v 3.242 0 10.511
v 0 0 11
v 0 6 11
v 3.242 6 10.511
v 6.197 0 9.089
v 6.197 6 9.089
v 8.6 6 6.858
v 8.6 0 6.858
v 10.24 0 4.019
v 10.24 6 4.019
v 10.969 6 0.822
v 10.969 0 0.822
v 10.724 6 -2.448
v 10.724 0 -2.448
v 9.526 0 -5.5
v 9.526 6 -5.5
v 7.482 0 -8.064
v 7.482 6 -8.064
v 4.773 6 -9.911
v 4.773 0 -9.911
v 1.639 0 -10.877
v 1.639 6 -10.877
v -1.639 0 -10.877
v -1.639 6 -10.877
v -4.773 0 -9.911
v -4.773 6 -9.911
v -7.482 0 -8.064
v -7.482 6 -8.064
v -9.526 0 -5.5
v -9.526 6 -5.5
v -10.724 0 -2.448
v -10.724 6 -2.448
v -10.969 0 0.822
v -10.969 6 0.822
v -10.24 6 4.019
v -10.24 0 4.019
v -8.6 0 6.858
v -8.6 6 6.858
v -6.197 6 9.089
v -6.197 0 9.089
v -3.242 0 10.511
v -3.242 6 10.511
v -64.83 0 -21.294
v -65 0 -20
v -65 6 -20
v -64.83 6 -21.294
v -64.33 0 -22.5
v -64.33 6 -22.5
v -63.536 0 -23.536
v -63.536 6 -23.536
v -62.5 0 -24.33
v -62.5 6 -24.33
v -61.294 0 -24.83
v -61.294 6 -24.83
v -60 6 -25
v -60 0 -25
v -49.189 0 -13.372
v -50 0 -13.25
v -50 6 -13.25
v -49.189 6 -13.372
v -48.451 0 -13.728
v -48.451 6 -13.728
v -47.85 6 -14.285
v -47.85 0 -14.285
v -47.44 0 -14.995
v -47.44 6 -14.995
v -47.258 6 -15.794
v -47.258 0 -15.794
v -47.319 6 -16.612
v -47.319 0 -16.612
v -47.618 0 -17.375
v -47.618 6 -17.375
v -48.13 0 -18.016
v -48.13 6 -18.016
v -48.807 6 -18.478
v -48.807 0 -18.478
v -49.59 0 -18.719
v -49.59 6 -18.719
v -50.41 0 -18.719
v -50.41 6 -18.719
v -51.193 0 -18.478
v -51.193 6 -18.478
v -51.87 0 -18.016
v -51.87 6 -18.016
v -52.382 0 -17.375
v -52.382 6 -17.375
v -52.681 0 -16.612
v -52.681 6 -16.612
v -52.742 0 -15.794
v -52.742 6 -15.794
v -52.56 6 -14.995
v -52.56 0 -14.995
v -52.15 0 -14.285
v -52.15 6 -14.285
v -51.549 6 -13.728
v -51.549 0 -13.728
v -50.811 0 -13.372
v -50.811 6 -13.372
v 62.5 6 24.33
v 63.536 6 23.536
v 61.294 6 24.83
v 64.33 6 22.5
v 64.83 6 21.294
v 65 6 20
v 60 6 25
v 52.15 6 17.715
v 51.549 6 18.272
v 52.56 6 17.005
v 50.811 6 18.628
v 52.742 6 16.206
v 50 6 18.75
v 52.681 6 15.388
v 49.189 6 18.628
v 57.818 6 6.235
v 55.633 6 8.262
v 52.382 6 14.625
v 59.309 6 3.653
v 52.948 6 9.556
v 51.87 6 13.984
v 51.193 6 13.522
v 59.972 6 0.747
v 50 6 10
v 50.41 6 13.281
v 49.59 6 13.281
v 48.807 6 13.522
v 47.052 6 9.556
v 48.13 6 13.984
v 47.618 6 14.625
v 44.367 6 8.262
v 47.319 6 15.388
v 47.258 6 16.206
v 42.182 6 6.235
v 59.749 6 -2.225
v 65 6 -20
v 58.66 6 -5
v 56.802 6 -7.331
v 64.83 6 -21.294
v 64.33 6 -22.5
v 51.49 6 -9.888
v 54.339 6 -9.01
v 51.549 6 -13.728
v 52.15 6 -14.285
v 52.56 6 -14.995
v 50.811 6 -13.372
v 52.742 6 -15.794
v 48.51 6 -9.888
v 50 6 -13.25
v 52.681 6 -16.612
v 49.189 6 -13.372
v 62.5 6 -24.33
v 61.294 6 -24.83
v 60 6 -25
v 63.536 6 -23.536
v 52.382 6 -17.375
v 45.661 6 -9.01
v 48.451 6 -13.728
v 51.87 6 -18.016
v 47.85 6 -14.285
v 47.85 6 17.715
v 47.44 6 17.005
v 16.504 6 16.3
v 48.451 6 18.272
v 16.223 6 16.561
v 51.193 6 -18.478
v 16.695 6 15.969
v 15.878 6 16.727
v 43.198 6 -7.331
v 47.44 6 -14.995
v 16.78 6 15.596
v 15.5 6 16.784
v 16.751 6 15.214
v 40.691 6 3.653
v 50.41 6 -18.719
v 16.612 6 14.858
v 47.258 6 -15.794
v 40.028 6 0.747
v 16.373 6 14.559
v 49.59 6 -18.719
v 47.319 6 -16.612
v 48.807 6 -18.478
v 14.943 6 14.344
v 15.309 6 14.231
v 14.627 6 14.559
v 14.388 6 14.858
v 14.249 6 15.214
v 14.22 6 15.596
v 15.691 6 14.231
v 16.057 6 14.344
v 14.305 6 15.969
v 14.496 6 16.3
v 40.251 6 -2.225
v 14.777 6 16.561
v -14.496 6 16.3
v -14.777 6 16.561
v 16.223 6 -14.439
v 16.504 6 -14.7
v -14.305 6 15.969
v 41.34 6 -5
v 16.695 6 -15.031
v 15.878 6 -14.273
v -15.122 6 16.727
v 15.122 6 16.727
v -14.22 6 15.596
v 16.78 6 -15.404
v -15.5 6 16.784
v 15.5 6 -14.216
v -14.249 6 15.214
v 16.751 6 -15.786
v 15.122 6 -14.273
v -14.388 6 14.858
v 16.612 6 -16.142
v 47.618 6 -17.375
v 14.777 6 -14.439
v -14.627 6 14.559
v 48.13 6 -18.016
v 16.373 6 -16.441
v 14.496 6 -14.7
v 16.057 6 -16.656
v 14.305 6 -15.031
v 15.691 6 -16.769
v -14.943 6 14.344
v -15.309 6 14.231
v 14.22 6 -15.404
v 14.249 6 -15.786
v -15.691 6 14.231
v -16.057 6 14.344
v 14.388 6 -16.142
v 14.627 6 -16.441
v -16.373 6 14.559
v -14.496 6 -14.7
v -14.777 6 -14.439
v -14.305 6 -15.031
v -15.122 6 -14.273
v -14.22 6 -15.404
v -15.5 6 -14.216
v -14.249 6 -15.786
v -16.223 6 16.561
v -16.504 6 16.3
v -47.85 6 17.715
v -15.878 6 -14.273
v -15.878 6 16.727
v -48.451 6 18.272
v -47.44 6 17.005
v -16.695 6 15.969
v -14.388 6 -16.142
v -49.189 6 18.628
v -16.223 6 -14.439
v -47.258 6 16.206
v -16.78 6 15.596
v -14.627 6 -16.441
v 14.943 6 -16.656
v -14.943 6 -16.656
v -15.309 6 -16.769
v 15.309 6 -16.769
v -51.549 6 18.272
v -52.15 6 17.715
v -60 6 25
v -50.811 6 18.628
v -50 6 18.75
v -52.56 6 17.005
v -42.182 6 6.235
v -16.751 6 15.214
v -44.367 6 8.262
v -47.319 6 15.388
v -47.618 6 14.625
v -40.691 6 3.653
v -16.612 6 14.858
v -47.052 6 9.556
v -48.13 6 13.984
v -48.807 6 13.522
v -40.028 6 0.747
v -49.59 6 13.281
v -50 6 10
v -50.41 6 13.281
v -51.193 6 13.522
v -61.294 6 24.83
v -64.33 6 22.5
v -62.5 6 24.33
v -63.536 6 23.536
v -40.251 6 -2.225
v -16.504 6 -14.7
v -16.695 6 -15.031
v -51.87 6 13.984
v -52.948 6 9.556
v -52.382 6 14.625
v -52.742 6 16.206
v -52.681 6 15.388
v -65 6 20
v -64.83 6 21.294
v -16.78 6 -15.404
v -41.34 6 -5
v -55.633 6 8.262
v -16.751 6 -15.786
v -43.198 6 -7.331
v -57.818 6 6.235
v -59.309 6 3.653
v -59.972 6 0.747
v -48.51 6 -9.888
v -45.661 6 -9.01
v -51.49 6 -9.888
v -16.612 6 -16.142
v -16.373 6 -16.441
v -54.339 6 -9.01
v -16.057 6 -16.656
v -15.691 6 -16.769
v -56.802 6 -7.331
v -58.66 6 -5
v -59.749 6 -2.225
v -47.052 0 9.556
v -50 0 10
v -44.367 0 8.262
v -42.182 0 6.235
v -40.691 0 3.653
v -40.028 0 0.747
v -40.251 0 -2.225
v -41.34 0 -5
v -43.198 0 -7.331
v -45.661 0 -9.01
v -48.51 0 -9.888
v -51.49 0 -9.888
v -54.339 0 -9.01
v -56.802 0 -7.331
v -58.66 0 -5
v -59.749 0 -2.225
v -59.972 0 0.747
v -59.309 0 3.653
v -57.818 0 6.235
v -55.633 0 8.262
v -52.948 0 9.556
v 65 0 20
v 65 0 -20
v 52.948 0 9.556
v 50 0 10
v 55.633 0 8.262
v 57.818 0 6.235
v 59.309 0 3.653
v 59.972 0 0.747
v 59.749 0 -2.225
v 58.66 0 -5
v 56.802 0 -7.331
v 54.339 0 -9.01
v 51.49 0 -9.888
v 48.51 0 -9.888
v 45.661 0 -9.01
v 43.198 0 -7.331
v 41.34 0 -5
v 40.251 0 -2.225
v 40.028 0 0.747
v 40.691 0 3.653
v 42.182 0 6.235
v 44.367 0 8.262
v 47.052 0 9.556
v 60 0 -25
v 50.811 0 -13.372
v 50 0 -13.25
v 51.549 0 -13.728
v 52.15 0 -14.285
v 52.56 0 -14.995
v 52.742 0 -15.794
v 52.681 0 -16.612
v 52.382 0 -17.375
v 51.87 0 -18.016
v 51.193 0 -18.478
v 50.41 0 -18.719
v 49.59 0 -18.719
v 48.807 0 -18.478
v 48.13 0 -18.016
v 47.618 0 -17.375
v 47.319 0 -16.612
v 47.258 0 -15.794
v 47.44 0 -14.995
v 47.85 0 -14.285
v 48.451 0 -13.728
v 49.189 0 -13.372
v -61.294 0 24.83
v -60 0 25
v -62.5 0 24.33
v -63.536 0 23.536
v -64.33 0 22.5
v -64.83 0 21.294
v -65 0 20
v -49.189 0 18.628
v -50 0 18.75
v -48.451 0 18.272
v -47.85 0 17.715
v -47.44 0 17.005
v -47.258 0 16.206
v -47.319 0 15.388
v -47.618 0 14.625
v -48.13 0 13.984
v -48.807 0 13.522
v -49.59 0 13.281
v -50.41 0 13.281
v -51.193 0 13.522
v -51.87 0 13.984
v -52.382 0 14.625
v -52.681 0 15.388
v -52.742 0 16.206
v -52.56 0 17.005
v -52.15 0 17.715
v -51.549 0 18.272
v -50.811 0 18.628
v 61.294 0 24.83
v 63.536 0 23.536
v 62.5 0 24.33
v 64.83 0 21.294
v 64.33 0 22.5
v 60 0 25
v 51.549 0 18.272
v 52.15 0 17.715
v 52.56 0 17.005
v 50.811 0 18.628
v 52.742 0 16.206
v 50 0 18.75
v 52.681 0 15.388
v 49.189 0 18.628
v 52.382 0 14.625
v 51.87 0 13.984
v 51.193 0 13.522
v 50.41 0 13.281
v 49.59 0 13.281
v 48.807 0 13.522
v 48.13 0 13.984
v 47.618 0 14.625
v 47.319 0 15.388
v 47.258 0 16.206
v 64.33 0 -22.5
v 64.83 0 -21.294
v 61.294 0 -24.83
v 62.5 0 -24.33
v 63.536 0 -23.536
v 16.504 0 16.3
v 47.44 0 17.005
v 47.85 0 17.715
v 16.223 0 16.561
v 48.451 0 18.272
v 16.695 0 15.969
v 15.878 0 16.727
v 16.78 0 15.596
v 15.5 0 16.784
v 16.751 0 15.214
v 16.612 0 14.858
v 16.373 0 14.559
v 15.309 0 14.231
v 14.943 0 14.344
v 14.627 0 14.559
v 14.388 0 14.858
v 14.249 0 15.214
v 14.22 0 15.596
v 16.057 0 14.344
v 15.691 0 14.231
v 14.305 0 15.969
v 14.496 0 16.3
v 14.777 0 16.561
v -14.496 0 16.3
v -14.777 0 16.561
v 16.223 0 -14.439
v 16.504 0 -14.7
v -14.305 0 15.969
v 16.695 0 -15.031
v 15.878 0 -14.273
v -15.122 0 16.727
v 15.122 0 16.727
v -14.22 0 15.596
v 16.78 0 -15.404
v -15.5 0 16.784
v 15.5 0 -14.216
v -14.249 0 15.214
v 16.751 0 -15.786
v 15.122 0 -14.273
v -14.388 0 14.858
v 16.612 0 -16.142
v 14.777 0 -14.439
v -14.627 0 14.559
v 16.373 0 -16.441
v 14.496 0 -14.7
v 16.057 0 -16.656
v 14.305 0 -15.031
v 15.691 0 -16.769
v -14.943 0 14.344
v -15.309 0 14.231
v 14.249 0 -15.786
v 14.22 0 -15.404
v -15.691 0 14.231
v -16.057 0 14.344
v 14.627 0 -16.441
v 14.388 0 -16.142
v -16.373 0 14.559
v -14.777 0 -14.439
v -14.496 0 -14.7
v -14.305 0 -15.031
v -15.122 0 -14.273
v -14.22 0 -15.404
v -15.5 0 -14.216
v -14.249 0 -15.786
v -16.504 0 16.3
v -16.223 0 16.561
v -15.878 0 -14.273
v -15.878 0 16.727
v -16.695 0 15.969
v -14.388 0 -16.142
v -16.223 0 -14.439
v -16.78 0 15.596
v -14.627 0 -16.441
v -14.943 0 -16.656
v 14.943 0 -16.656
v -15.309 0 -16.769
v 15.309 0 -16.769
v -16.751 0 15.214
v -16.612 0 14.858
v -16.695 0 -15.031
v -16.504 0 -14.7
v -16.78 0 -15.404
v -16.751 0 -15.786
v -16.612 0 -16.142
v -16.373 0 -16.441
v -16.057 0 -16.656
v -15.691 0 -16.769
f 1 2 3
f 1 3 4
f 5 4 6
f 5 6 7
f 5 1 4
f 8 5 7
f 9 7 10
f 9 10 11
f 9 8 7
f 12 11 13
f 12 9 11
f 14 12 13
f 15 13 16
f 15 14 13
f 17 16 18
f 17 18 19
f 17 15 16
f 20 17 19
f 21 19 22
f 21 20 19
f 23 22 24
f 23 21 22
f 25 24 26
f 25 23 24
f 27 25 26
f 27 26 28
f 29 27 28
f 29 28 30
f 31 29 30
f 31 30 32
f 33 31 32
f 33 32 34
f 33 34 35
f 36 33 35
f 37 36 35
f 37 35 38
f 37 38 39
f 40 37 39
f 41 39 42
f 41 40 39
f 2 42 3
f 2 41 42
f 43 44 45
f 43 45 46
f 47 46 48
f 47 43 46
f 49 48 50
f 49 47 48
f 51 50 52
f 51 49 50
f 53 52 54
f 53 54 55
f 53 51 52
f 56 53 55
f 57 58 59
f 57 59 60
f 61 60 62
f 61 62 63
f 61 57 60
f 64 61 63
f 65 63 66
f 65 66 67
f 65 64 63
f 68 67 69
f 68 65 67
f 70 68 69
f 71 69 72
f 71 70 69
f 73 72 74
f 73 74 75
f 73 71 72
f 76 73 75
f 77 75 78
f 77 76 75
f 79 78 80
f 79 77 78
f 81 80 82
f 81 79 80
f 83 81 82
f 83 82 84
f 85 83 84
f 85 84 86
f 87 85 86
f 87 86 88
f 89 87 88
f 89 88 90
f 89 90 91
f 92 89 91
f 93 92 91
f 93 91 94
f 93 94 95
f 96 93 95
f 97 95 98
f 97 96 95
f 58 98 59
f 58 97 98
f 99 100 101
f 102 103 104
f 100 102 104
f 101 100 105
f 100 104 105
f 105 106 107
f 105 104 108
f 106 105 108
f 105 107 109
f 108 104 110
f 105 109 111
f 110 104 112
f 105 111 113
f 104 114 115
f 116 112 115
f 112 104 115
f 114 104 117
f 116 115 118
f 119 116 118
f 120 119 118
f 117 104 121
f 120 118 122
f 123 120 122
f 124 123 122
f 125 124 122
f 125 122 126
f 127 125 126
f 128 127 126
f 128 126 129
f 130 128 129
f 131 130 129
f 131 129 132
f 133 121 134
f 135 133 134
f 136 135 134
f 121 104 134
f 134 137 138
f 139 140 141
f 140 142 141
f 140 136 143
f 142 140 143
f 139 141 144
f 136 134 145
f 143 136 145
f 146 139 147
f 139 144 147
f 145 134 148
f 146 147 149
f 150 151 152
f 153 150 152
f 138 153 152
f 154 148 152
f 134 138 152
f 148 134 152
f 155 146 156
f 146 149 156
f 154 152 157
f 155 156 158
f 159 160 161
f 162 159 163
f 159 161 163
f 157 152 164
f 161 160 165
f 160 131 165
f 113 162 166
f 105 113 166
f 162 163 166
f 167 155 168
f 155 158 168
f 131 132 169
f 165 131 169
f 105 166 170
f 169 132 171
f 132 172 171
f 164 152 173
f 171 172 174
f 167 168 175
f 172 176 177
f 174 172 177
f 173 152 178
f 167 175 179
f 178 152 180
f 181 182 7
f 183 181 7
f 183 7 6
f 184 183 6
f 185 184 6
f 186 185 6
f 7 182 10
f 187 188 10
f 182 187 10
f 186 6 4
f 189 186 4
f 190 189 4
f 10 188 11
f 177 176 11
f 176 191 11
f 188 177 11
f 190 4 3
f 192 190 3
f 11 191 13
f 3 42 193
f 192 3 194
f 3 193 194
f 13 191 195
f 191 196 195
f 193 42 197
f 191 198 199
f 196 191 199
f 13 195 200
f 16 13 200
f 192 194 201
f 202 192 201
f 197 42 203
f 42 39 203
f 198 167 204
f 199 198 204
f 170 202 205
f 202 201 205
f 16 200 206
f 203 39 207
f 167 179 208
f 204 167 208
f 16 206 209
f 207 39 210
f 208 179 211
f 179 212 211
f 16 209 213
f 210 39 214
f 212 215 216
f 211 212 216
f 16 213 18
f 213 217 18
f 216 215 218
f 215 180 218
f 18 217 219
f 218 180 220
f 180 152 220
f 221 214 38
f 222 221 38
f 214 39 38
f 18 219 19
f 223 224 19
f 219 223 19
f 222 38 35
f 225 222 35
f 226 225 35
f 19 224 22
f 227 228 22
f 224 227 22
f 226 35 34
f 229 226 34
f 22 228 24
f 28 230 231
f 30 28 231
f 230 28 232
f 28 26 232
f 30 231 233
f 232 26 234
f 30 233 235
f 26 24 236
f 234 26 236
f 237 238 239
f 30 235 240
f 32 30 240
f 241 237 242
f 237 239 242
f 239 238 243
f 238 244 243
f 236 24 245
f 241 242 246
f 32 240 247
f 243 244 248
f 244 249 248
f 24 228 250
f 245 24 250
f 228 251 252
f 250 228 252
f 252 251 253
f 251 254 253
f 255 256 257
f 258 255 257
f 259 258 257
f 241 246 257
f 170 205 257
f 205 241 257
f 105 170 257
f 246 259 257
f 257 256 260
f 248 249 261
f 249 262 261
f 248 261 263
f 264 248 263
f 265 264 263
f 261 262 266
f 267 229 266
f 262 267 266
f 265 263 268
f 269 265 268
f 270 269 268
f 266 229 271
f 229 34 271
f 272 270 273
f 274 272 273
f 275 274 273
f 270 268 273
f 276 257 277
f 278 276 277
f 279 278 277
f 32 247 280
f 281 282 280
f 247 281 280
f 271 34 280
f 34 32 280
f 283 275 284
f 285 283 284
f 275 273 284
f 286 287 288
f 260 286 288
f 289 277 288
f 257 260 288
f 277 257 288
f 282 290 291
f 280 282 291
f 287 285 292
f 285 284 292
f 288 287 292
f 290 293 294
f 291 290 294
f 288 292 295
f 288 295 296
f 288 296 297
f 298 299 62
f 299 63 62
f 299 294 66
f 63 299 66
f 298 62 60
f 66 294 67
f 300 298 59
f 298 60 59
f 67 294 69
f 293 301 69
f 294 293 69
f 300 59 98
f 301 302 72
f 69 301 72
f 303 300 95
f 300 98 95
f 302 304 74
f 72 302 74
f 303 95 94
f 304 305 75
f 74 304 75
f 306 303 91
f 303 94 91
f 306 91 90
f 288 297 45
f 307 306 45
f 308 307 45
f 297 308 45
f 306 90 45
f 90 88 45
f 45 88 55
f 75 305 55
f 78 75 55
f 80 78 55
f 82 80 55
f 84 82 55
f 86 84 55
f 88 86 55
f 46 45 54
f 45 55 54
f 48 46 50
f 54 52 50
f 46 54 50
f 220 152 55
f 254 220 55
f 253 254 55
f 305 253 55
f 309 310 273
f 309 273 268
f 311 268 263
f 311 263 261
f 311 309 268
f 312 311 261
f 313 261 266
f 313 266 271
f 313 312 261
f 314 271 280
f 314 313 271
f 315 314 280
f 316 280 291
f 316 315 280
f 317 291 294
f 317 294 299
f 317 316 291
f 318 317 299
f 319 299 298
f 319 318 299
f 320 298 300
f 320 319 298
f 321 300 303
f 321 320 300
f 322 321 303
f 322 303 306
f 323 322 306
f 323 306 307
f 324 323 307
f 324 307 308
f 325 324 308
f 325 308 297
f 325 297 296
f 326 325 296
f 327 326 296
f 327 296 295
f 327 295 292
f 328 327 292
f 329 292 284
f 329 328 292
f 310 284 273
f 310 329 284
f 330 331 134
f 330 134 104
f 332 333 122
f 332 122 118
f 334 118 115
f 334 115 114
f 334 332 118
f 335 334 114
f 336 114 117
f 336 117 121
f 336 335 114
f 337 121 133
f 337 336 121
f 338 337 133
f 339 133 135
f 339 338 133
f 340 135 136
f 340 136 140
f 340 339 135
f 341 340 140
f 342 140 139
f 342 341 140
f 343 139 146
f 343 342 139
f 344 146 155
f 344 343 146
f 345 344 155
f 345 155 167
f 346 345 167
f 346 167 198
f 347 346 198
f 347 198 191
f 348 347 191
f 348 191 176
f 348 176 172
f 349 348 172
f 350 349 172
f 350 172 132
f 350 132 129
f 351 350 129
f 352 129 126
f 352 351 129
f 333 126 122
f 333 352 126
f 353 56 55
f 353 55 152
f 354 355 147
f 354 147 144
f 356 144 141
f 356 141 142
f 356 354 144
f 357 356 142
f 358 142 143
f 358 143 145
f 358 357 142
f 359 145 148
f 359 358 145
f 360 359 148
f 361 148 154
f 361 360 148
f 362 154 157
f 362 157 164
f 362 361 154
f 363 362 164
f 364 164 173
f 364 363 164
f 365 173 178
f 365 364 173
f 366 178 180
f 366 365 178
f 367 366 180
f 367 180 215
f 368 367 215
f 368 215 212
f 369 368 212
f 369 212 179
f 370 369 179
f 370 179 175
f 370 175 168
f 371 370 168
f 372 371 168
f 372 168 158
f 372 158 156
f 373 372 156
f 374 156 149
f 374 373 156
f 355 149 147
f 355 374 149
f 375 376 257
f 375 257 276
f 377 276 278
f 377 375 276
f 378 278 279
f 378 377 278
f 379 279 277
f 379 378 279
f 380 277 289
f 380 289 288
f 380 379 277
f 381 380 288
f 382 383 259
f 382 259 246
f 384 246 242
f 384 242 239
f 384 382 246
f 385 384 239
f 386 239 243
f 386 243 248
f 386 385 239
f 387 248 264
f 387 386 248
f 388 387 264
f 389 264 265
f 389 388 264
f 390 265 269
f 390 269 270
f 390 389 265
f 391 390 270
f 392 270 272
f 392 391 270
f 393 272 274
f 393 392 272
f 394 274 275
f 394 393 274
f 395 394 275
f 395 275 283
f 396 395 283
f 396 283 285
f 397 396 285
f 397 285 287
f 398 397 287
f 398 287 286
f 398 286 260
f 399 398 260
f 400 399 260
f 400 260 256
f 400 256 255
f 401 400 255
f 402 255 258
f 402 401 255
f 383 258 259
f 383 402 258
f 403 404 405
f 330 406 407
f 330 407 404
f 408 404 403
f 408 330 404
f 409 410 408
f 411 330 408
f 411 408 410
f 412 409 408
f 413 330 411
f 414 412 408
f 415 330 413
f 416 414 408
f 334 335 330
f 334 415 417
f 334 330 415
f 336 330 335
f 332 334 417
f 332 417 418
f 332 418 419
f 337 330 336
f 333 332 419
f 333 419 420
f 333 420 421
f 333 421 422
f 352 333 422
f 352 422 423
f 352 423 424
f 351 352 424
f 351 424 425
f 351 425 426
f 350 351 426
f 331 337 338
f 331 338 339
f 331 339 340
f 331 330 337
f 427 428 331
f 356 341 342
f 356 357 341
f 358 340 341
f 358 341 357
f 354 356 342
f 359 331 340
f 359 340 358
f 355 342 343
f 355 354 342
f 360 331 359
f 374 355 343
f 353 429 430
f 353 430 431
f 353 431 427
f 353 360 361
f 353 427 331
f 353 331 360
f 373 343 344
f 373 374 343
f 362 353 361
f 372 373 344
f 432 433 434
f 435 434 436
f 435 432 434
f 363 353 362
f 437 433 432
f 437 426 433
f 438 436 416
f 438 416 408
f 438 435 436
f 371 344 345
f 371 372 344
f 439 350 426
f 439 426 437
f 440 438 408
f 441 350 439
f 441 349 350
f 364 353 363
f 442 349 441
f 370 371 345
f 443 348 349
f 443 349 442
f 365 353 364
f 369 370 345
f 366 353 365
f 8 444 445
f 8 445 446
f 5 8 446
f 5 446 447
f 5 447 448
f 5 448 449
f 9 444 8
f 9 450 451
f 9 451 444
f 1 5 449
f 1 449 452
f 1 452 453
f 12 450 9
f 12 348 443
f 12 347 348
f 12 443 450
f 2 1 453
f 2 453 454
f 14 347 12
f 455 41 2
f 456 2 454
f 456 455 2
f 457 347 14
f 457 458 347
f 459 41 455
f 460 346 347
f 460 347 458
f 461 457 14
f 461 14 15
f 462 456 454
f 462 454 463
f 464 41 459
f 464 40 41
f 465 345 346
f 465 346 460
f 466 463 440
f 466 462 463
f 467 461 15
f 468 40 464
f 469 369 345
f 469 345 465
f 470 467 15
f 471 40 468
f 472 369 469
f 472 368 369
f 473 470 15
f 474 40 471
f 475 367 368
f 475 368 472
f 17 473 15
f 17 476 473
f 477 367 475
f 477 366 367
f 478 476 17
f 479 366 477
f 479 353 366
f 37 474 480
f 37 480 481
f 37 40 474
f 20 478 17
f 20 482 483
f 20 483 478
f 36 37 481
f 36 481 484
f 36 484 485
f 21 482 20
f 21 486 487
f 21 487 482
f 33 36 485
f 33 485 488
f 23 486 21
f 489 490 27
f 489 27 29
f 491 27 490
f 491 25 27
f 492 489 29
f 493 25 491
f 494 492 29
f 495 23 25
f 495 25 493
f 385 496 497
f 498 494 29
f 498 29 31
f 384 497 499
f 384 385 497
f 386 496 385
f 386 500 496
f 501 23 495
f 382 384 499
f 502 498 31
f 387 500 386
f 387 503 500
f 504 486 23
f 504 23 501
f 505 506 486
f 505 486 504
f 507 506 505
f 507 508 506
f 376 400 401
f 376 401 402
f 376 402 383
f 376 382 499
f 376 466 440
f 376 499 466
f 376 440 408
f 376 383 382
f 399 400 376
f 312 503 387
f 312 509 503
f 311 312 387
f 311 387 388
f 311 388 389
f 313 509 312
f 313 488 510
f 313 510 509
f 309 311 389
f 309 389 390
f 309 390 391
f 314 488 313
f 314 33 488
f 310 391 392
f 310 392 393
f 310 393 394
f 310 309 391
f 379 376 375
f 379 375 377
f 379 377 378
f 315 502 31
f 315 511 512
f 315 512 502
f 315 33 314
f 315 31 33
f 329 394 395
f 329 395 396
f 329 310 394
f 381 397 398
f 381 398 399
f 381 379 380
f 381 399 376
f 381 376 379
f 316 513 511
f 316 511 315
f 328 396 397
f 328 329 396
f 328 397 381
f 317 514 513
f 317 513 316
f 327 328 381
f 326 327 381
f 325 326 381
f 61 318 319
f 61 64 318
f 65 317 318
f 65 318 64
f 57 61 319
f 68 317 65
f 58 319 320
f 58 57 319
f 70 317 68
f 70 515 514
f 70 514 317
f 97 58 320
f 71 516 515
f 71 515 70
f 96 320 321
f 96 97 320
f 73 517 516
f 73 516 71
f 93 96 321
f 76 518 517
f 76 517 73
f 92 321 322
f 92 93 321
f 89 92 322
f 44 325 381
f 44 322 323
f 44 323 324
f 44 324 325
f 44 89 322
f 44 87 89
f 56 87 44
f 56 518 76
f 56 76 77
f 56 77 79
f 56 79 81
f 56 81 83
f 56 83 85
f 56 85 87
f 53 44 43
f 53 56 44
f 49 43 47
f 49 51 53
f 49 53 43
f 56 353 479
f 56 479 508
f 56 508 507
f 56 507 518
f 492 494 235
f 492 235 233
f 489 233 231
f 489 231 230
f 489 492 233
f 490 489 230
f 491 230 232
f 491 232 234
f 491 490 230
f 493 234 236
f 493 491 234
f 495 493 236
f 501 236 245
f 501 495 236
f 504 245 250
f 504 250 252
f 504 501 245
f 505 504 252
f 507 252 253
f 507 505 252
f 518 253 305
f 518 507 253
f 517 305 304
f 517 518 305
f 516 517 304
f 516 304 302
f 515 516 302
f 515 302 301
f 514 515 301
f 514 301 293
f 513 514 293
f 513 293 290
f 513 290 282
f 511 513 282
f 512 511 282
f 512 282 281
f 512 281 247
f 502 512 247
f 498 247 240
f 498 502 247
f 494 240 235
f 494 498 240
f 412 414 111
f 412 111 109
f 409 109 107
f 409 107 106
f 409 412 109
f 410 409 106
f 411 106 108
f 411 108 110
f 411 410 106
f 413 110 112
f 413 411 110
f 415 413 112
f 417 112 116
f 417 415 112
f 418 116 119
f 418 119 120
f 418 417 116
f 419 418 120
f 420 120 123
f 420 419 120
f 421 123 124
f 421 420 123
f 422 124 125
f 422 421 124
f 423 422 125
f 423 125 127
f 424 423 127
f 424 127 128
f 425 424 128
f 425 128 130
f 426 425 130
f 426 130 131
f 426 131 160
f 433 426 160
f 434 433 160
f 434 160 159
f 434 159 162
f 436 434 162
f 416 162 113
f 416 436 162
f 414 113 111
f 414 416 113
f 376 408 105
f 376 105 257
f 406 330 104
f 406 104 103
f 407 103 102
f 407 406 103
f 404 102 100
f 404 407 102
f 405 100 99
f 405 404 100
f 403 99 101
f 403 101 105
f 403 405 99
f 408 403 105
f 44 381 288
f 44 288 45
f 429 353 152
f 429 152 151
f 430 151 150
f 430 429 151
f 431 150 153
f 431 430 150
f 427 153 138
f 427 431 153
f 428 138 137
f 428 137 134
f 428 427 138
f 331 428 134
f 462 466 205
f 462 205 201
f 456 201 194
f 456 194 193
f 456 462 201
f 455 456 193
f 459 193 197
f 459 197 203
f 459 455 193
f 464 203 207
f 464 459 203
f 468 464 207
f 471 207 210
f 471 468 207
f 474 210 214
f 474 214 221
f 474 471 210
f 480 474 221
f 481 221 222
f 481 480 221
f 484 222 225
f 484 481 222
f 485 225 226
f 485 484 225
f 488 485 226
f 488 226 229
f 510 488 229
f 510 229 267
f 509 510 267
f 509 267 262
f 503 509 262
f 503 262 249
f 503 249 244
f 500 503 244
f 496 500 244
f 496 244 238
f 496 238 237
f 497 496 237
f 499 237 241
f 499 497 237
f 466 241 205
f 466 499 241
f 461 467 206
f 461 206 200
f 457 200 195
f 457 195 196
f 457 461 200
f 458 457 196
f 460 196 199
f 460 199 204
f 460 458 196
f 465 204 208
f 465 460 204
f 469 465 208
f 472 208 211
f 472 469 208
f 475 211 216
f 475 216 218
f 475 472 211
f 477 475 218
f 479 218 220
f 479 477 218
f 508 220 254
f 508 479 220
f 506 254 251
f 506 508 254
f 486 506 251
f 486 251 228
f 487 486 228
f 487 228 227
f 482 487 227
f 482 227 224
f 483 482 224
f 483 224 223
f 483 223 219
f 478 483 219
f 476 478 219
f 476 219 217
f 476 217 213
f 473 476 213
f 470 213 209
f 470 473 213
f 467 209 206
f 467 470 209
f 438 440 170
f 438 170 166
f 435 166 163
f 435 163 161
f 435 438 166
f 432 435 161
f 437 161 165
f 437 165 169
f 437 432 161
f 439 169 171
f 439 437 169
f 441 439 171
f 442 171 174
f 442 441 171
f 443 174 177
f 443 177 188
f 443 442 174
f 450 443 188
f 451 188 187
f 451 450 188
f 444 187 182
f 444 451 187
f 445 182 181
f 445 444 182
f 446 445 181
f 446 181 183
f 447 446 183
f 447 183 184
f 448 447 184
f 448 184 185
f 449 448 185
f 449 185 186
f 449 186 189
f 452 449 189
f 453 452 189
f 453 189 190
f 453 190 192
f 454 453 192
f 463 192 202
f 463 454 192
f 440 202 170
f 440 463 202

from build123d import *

# Parameters (mm, degrees)
SKETCH_1_R      = 2.75
SKETCH_1_R_2    = 11
SKETCH_1_R_3    = 1.283558174
SKETCH_1_R_4    = 10
EXTRUDE_1_DEPTH = 6


with BuildPart() as part:
    # 草图1 → 凸台-拉伸1 (new body)
    with BuildSketch(Plane(origin=(0, 0, 0), x_dir=(1, 0, 0), z_dir=(0, 1, 0))):
        with BuildLine():
            ThreePointArc((-65, 20), (-63.535533906, 23.535533906), (-60, 25))
            Line((-60, 25), (0, 25))
            Line((0, 25), (60, 25))
            ThreePointArc((60, 25), (63.535533906, 23.535533906), (65, 20))
            Line((65, 20), (65, -20))
            ThreePointArc((65, -20), (63.535533906, -23.535533906), (60, -25))
            Line((60, -25), (-60, -25))
            ThreePointArc((-60, -25), (-63.535533906, -23.535533906), (-65, -20))
            Line((-65, -20), (-65, 20))
        make_face()
        with Locations(Location((-50, 16, 0), (0, 0, 270))):
            Circle(SKETCH_1_R, mode=Mode.SUBTRACT)
        with Locations(Location((0, 0, 0), (0, 0, 270))):
            Circle(SKETCH_1_R_2, mode=Mode.SUBTRACT)
        with Locations(Location((15.5, 15.5, 0), (0, 0, 270))):
            Circle(SKETCH_1_R_3, mode=Mode.SUBTRACT)
        with Locations(Location((15.5, -15.5, 0), (0, 0, 270))):
            Circle(SKETCH_1_R_3, mode=Mode.SUBTRACT)
        with Locations(Location((-15.5, -15.5, 0), (0, 0, 270))):
            Circle(SKETCH_1_R_3, mode=Mode.SUBTRACT)
        with Locations(Location((-15.5, 15.5, 0), (0, 0, 270))):
            Circle(SKETCH_1_R_3, mode=Mode.SUBTRACT)
        with Locations(Location((50, 0, 0), (0, 0, 270))):
            Circle(SKETCH_1_R_4, mode=Mode.SUBTRACT)
        with Locations(Location((50, 16, 0), (0, 0, 270))):
            Circle(SKETCH_1_R, mode=Mode.SUBTRACT)
        with Locations(Location((50, -16, 0), (0, 0, 270))):
            Circle(SKETCH_1_R, mode=Mode.SUBTRACT)
        with Locations(Location((-50, -16, 0), (0, 0, 270))):
            Circle(SKETCH_1_R, mode=Mode.SUBTRACT)
        with Locations(Location((-50, 0, 0), (0, 0, 270))):
            Circle(SKETCH_1_R_4, mode=Mode.SUBTRACT)
    extrude(amount=EXTRUDE_1_DEPTH)


solid = part.part
